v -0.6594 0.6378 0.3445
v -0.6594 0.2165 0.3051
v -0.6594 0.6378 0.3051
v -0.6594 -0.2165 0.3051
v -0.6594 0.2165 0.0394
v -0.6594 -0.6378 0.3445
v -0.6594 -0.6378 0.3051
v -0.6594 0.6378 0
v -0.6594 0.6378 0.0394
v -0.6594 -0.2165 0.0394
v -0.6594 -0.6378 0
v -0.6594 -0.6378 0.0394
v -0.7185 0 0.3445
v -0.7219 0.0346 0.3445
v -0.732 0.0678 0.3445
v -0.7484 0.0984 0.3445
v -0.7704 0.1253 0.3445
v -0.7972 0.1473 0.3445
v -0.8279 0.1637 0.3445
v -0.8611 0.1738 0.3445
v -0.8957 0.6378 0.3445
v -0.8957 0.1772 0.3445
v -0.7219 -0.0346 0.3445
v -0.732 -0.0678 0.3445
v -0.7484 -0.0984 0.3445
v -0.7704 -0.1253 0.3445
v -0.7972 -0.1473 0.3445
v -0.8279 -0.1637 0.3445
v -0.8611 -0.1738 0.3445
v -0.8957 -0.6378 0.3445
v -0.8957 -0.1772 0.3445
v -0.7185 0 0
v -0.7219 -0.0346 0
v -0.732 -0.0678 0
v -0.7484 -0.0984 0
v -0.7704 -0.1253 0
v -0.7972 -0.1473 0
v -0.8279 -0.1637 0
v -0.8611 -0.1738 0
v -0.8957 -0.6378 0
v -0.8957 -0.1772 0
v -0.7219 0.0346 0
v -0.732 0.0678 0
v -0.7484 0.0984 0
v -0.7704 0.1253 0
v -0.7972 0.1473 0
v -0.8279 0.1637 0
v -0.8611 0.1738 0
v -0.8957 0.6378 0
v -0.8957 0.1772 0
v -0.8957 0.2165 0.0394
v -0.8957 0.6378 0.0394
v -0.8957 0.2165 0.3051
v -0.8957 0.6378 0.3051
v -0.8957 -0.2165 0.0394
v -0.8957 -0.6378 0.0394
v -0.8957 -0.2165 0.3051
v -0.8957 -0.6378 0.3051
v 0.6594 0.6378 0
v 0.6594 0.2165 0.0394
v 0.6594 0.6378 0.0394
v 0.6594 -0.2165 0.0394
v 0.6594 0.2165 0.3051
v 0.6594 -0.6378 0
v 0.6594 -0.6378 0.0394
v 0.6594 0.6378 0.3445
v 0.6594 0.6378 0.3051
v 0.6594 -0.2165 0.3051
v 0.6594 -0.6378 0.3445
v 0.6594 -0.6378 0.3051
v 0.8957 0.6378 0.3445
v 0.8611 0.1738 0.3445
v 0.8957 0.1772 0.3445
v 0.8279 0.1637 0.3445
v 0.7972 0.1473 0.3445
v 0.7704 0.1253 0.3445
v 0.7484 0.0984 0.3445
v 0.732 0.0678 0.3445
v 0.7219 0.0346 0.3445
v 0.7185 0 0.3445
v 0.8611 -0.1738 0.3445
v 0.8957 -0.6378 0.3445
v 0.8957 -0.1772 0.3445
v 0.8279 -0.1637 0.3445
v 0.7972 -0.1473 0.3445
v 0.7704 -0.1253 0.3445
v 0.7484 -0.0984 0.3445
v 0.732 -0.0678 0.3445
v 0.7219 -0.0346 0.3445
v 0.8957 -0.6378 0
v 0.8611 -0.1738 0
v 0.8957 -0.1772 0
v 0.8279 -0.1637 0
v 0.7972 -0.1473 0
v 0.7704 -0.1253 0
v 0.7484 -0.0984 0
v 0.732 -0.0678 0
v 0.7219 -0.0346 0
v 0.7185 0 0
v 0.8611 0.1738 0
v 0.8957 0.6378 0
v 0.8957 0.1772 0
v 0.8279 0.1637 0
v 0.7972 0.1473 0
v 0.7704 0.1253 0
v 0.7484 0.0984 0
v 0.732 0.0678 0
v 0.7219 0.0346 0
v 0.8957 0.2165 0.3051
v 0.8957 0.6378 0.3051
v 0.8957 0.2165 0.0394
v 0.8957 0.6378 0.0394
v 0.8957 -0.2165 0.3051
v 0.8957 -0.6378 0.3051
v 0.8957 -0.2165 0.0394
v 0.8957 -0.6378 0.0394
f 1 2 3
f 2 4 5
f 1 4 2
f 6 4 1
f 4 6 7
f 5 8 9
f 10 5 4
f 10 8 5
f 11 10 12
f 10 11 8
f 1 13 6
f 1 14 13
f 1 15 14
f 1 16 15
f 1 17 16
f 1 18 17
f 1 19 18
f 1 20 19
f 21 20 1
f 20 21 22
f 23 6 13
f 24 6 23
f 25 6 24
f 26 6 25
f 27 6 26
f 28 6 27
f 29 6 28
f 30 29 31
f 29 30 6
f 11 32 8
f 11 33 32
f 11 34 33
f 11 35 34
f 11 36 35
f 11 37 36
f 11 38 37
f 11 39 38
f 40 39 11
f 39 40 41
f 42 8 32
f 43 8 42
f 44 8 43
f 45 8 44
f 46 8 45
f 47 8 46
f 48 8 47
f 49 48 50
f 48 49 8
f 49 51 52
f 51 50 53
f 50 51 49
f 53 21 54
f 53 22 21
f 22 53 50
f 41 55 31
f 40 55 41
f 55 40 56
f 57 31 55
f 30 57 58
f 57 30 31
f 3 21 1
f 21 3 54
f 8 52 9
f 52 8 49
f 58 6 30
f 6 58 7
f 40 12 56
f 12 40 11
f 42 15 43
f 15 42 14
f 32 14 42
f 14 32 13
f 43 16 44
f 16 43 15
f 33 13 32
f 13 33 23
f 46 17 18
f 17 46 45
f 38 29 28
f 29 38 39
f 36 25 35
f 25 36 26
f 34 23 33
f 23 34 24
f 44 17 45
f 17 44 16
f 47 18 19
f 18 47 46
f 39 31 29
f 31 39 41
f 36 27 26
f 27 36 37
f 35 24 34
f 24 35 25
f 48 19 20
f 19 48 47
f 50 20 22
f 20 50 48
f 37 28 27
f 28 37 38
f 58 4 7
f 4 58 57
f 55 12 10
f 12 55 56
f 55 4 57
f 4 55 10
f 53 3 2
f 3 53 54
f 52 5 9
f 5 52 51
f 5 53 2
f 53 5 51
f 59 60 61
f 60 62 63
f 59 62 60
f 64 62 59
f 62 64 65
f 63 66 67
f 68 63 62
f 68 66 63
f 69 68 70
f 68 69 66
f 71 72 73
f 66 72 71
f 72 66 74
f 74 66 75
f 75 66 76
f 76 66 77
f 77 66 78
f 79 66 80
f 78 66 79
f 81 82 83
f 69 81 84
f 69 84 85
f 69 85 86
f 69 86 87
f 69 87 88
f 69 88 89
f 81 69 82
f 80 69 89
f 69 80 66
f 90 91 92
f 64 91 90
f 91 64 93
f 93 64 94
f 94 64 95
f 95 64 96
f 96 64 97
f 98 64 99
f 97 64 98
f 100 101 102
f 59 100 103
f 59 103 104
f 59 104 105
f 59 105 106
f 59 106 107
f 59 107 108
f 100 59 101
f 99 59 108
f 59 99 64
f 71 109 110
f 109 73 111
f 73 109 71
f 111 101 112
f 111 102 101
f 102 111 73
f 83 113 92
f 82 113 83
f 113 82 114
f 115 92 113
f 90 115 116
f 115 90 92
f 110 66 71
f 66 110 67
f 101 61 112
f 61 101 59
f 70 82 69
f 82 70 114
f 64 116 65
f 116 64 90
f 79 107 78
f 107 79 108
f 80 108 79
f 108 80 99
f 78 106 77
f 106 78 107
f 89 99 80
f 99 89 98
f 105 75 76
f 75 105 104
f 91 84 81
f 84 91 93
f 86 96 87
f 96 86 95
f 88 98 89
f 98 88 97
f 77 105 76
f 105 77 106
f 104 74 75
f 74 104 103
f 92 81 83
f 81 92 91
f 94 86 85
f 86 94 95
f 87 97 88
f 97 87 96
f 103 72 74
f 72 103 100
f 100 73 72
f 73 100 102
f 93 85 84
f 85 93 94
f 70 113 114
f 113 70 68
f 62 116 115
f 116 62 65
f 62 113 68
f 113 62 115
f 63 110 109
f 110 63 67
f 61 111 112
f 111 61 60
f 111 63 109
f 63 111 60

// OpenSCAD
// file: defines.scad
A = 4.55;   // 4.37...4.73
B = 3.24;   // 3.07...3.41
C = 0.875;  // 0.55...1.20
D = 0.6;    // 0.25...0.95
E = 0.45;   // 0.25...0.65

pt = 0.1; // Толщина элеметов (дорожек, краски и т.п)
lab_mark = 0.3; // Полоска

$fn = 32;

scale = 1/2.54;
// main file
include <defines.scad>

module Pin()
{
  union() {
    difference() {
      translate([-A/2, -B/2, 0]) cube([D, B, C]);
      translate([-A/2, 0, -1]) cylinder(r = E, h = C+2);
      translate([-A/2-0.1, -B/2-0.1, pt]) cube([D+0.2, B/2-E-pt+0.1, C-pt-pt]);
      mirror([0,1,0]) translate([-A/2-0.1, -B/2-0.1, pt]) cube([D+0.2, B/2-E-pt+0.1, C-pt-pt]);
      /*union() {
        translate([-A/2, -B/2, C-pt]) cube([D, B, pt]);
      }
      */
    }
    /*difference(){
      translate([-A/2, 0, 0]) cylinder(r = E+pt, h = C);
      translate([-A/2, 0, -1]) cylinder(r = E, h = C+2);
      translate([-A/2-D, -B/2, -1]) cube([D, B, C+2]);
    }*/
  }
}


module Pin1()
{
  union() {
    difference() {
      union() {
        translate([-A/2, -B/2, 0]) cube([D, B, pt]);
        translate([-A/2, -B/2, C-pt]) cube([D, B, pt]);
      }
      translate([-A/2, 0, -1]) cylinder(r = E+pt, h = C+2);
    }
    difference(){
      translate([-A/2, 0, 0]) cylinder(r = E+pt, h = C);
      translate([-A/2, 0, -1]) cylinder(r = E, h = C+2);
      translate([-A/2-D, -B/2, -1]) cube([D, B, C+2]);
    }
  }
}

module Pin2()
{
  difference(){
    translate([-A/2, -B/2, 0]) cube([D, B, C]);
    difference(){
      translate([-A/2, 0, pt]) cylinder(r = B, h = C-pt-pt);
      translate([-A/2, 0, pt/2]) cylinder(r = E+pt, h = C-pt);
    }
    translate([-A/2, 0, -1]) cylinder(r = E, h = C+2);
  }
}


color("White") scale(scale) Pin();
color("White") scale(scale) mirror([1,0,0]) Pin();
